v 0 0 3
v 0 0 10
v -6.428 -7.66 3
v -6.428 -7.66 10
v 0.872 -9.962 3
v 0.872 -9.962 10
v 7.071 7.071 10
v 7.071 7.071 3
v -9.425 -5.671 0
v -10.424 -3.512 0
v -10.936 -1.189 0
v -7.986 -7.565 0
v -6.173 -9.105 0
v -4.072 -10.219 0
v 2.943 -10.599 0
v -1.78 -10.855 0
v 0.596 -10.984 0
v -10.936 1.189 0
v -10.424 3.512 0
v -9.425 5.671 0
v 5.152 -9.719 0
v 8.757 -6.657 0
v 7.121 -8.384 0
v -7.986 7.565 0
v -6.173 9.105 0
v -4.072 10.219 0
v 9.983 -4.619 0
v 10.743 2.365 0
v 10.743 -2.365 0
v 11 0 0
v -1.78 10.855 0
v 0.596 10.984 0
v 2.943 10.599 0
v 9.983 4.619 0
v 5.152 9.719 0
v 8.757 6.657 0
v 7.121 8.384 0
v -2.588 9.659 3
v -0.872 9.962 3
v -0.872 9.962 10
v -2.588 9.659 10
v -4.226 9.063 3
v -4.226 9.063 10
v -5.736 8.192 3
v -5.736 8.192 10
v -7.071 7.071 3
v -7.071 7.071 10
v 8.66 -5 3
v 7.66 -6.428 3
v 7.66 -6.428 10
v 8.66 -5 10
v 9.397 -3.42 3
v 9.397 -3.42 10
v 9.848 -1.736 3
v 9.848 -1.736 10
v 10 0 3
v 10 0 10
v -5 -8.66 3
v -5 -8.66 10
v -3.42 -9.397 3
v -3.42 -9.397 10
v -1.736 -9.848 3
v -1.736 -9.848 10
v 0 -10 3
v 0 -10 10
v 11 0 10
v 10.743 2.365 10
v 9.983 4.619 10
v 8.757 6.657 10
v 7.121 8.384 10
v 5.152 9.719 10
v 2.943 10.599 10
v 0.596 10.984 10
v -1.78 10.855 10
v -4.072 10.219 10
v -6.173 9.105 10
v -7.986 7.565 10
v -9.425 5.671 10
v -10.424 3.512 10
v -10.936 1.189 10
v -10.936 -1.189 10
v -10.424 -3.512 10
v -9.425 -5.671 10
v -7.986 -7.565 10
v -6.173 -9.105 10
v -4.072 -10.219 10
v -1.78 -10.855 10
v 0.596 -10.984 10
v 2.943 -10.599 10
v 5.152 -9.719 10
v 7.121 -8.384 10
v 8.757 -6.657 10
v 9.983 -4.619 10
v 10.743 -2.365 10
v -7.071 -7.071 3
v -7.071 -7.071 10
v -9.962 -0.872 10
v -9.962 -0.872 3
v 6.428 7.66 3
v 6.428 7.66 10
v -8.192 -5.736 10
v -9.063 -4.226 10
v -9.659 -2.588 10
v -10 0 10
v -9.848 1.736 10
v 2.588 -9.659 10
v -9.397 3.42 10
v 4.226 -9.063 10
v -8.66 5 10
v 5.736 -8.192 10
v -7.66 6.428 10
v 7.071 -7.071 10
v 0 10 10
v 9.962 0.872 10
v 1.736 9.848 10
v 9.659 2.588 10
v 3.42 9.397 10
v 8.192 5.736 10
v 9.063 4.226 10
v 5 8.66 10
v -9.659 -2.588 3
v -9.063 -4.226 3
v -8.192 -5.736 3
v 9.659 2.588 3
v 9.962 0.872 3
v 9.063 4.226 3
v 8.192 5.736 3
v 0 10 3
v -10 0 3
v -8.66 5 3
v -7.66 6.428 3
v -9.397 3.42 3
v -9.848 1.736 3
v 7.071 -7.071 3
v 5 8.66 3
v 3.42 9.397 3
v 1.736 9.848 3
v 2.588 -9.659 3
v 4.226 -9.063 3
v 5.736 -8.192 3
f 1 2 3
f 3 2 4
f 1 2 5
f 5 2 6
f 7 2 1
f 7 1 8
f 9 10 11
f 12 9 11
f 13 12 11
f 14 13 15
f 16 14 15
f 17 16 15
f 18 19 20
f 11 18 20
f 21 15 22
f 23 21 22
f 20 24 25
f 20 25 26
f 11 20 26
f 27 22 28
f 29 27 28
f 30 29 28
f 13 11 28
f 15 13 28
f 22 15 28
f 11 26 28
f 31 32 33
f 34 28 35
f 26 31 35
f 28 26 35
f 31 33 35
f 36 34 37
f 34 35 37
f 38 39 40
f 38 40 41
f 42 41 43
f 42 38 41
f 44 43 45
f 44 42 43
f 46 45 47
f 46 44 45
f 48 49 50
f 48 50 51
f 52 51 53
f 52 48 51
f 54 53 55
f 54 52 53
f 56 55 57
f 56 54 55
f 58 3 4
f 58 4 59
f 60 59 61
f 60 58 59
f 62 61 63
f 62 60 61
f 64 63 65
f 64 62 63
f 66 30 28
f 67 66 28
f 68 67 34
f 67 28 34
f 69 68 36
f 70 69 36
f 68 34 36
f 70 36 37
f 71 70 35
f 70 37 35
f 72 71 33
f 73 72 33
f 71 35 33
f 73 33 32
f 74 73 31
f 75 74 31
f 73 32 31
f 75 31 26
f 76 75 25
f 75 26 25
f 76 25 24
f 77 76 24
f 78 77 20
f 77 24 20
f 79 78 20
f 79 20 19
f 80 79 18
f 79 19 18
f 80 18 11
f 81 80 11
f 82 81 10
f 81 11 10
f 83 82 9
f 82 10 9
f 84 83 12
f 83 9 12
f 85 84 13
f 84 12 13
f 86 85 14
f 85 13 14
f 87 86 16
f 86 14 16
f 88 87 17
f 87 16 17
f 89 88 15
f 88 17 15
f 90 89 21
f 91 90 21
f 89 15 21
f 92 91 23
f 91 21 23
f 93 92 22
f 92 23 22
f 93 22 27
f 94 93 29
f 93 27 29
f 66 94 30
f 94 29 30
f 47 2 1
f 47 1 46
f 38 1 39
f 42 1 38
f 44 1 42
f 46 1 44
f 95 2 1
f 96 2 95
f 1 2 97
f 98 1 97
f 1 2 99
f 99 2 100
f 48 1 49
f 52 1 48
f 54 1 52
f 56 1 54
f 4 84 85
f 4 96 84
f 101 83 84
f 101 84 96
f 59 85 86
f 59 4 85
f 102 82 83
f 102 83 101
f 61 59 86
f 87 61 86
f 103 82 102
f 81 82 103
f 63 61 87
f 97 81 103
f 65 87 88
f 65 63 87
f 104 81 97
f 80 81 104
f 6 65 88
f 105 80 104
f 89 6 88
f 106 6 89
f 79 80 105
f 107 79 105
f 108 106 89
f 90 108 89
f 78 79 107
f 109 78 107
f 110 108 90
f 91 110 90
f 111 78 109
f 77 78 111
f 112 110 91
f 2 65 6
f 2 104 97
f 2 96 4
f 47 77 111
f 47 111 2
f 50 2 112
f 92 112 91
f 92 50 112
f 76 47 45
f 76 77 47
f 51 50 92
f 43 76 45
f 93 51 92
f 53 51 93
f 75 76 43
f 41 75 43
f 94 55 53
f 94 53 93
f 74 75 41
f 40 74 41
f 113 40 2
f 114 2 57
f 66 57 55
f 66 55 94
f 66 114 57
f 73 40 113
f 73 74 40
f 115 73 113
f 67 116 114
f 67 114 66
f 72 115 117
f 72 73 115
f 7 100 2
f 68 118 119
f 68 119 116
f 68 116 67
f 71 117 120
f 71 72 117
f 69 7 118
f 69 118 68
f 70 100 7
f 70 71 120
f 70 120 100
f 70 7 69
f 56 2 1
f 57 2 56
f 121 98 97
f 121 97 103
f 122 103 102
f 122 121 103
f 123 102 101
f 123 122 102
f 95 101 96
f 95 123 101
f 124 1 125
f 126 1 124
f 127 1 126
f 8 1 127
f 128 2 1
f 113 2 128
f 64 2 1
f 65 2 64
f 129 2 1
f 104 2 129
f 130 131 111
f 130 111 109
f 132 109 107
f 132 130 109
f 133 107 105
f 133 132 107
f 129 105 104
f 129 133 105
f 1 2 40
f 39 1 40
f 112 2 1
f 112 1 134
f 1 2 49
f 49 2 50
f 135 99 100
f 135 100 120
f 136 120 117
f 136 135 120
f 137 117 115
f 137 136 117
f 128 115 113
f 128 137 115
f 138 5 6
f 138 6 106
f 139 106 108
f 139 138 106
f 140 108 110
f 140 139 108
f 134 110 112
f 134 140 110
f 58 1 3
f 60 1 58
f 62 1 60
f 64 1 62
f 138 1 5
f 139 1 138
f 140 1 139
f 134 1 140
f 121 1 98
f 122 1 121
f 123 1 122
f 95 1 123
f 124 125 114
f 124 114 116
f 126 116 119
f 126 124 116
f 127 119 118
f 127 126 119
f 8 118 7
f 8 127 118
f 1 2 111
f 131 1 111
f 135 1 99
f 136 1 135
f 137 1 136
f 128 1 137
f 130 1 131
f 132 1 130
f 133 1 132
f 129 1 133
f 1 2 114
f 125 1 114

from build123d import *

# Parameters (mm, degrees)
CYLINDER001_W     = 10
CYLINDER001_H     = 10
CYLINDER001_ANGLE = 320
CYLINDER_R        = 10
CYLINDER_DEPTH    = 10
ARRAY_COUNT       = 8
CYLINDER002_R     = 11
CYLINDER002_DEPTH = 10


with BuildPart() as cilindro:
    # Cylinder001 → Cylinder001 (revolve)
    with BuildSketch(Plane.XZ):
        with Locations((5, 5)):
            Rectangle(CYLINDER001_W, CYLINDER001_H)
    revolve(axis=Axis((0, 0, 0), (0, 0, 1)), revolution_arc=CYLINDER001_ANGLE)


with BuildPart() as array:
    # Cylinder → Cylinder (new body)
    with BuildSketch(Plane.XY):
        Circle(CYLINDER_R)
    extrude(amount=CYLINDER_DEPTH)

    # Cut: cut Cilindro
    add(cilindro.part, mode=Mode.SUBTRACT)


with BuildPart() as array_1:
    # Cut placement: moved
    add(array.part.moved(Location((0, 0, 3))))

    # Array: Array ×8 about axis
    array_axis = Axis((0, 0, 0), (0, 0, 1))


with BuildPart() as array_2:
    add(array_1.part)
    for i in range(1, ARRAY_COUNT):
        add(array_1.part.rotate(array_axis, i * 360 / ARRAY_COUNT))


with BuildPart() as cut001:
    # Cylinder002 → Cylinder002 (new body)
    with BuildSketch(Plane.XY):
        Circle(CYLINDER002_R)
    extrude(amount=CYLINDER002_DEPTH)

    # Cut001: cut Array
    add(array_2.part, mode=Mode.SUBTRACT)


solid = cut001.part
